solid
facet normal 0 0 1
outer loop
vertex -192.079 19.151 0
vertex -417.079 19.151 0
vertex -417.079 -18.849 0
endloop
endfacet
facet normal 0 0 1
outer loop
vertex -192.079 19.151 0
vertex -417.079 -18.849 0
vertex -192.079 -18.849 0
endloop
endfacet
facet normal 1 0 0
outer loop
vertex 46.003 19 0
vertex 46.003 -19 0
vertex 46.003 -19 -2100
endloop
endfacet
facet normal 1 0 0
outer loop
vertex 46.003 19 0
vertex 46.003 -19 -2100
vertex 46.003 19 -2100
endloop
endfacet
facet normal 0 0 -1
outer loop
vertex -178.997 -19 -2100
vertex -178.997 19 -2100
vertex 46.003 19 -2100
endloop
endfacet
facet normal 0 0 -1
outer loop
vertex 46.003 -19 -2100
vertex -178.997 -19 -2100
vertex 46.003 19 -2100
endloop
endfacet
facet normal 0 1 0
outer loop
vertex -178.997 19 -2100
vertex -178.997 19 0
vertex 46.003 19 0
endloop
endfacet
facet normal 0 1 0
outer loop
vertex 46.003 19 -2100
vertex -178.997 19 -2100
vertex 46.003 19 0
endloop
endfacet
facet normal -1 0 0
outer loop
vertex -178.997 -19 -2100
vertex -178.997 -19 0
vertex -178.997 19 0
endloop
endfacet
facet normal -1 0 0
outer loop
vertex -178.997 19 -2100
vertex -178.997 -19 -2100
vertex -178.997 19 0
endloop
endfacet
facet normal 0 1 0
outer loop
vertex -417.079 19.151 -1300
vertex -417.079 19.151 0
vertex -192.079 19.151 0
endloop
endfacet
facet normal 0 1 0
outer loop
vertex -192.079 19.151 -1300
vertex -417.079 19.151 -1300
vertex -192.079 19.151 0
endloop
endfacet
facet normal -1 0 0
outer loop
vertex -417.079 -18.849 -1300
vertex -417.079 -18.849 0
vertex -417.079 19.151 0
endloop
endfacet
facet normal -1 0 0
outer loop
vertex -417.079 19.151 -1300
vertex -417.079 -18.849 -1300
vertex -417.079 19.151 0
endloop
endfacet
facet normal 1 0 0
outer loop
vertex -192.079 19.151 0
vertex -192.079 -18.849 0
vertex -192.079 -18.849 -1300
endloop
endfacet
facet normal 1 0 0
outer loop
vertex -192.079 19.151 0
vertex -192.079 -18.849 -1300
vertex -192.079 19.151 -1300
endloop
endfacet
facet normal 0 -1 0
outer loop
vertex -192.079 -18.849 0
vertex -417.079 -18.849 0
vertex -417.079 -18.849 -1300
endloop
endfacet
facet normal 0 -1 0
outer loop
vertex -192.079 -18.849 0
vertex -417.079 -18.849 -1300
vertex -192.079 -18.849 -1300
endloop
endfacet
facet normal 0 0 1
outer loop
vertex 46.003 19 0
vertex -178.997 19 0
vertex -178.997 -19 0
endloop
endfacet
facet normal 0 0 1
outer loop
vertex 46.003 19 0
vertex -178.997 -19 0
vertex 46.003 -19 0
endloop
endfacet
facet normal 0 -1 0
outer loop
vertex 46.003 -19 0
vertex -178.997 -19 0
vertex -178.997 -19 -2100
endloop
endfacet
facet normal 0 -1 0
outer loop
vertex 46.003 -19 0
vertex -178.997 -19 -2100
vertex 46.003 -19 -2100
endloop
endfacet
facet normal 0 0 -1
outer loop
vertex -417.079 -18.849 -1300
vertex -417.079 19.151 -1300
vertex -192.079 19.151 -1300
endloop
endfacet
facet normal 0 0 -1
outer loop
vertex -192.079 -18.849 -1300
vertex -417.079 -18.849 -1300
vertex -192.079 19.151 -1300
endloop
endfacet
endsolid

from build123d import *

# Parameters (mm, degrees)
F0_W     = 225
F0_H     = 38
F1_DEPTH = 2100
F2_DEPTH = 1300


with BuildPart() as f1:
    # F0 (on Top) → F1 (new body)
    with BuildSketch(Plane.XY):
        with Locations((-66.497356, 0)):
            Rectangle(F0_W, F0_H)
    extrude(amount=-F1_DEPTH)


with BuildPart() as f2:
    # F0 (on Top) → F2 (new body)
    with BuildSketch(Plane.XY):
        with Locations((-304.578662, 0.150505)):
            Rectangle(F0_W, F0_H)
    extrude(amount=-F2_DEPTH)


solid = Compound([f1.part, f2.part])
